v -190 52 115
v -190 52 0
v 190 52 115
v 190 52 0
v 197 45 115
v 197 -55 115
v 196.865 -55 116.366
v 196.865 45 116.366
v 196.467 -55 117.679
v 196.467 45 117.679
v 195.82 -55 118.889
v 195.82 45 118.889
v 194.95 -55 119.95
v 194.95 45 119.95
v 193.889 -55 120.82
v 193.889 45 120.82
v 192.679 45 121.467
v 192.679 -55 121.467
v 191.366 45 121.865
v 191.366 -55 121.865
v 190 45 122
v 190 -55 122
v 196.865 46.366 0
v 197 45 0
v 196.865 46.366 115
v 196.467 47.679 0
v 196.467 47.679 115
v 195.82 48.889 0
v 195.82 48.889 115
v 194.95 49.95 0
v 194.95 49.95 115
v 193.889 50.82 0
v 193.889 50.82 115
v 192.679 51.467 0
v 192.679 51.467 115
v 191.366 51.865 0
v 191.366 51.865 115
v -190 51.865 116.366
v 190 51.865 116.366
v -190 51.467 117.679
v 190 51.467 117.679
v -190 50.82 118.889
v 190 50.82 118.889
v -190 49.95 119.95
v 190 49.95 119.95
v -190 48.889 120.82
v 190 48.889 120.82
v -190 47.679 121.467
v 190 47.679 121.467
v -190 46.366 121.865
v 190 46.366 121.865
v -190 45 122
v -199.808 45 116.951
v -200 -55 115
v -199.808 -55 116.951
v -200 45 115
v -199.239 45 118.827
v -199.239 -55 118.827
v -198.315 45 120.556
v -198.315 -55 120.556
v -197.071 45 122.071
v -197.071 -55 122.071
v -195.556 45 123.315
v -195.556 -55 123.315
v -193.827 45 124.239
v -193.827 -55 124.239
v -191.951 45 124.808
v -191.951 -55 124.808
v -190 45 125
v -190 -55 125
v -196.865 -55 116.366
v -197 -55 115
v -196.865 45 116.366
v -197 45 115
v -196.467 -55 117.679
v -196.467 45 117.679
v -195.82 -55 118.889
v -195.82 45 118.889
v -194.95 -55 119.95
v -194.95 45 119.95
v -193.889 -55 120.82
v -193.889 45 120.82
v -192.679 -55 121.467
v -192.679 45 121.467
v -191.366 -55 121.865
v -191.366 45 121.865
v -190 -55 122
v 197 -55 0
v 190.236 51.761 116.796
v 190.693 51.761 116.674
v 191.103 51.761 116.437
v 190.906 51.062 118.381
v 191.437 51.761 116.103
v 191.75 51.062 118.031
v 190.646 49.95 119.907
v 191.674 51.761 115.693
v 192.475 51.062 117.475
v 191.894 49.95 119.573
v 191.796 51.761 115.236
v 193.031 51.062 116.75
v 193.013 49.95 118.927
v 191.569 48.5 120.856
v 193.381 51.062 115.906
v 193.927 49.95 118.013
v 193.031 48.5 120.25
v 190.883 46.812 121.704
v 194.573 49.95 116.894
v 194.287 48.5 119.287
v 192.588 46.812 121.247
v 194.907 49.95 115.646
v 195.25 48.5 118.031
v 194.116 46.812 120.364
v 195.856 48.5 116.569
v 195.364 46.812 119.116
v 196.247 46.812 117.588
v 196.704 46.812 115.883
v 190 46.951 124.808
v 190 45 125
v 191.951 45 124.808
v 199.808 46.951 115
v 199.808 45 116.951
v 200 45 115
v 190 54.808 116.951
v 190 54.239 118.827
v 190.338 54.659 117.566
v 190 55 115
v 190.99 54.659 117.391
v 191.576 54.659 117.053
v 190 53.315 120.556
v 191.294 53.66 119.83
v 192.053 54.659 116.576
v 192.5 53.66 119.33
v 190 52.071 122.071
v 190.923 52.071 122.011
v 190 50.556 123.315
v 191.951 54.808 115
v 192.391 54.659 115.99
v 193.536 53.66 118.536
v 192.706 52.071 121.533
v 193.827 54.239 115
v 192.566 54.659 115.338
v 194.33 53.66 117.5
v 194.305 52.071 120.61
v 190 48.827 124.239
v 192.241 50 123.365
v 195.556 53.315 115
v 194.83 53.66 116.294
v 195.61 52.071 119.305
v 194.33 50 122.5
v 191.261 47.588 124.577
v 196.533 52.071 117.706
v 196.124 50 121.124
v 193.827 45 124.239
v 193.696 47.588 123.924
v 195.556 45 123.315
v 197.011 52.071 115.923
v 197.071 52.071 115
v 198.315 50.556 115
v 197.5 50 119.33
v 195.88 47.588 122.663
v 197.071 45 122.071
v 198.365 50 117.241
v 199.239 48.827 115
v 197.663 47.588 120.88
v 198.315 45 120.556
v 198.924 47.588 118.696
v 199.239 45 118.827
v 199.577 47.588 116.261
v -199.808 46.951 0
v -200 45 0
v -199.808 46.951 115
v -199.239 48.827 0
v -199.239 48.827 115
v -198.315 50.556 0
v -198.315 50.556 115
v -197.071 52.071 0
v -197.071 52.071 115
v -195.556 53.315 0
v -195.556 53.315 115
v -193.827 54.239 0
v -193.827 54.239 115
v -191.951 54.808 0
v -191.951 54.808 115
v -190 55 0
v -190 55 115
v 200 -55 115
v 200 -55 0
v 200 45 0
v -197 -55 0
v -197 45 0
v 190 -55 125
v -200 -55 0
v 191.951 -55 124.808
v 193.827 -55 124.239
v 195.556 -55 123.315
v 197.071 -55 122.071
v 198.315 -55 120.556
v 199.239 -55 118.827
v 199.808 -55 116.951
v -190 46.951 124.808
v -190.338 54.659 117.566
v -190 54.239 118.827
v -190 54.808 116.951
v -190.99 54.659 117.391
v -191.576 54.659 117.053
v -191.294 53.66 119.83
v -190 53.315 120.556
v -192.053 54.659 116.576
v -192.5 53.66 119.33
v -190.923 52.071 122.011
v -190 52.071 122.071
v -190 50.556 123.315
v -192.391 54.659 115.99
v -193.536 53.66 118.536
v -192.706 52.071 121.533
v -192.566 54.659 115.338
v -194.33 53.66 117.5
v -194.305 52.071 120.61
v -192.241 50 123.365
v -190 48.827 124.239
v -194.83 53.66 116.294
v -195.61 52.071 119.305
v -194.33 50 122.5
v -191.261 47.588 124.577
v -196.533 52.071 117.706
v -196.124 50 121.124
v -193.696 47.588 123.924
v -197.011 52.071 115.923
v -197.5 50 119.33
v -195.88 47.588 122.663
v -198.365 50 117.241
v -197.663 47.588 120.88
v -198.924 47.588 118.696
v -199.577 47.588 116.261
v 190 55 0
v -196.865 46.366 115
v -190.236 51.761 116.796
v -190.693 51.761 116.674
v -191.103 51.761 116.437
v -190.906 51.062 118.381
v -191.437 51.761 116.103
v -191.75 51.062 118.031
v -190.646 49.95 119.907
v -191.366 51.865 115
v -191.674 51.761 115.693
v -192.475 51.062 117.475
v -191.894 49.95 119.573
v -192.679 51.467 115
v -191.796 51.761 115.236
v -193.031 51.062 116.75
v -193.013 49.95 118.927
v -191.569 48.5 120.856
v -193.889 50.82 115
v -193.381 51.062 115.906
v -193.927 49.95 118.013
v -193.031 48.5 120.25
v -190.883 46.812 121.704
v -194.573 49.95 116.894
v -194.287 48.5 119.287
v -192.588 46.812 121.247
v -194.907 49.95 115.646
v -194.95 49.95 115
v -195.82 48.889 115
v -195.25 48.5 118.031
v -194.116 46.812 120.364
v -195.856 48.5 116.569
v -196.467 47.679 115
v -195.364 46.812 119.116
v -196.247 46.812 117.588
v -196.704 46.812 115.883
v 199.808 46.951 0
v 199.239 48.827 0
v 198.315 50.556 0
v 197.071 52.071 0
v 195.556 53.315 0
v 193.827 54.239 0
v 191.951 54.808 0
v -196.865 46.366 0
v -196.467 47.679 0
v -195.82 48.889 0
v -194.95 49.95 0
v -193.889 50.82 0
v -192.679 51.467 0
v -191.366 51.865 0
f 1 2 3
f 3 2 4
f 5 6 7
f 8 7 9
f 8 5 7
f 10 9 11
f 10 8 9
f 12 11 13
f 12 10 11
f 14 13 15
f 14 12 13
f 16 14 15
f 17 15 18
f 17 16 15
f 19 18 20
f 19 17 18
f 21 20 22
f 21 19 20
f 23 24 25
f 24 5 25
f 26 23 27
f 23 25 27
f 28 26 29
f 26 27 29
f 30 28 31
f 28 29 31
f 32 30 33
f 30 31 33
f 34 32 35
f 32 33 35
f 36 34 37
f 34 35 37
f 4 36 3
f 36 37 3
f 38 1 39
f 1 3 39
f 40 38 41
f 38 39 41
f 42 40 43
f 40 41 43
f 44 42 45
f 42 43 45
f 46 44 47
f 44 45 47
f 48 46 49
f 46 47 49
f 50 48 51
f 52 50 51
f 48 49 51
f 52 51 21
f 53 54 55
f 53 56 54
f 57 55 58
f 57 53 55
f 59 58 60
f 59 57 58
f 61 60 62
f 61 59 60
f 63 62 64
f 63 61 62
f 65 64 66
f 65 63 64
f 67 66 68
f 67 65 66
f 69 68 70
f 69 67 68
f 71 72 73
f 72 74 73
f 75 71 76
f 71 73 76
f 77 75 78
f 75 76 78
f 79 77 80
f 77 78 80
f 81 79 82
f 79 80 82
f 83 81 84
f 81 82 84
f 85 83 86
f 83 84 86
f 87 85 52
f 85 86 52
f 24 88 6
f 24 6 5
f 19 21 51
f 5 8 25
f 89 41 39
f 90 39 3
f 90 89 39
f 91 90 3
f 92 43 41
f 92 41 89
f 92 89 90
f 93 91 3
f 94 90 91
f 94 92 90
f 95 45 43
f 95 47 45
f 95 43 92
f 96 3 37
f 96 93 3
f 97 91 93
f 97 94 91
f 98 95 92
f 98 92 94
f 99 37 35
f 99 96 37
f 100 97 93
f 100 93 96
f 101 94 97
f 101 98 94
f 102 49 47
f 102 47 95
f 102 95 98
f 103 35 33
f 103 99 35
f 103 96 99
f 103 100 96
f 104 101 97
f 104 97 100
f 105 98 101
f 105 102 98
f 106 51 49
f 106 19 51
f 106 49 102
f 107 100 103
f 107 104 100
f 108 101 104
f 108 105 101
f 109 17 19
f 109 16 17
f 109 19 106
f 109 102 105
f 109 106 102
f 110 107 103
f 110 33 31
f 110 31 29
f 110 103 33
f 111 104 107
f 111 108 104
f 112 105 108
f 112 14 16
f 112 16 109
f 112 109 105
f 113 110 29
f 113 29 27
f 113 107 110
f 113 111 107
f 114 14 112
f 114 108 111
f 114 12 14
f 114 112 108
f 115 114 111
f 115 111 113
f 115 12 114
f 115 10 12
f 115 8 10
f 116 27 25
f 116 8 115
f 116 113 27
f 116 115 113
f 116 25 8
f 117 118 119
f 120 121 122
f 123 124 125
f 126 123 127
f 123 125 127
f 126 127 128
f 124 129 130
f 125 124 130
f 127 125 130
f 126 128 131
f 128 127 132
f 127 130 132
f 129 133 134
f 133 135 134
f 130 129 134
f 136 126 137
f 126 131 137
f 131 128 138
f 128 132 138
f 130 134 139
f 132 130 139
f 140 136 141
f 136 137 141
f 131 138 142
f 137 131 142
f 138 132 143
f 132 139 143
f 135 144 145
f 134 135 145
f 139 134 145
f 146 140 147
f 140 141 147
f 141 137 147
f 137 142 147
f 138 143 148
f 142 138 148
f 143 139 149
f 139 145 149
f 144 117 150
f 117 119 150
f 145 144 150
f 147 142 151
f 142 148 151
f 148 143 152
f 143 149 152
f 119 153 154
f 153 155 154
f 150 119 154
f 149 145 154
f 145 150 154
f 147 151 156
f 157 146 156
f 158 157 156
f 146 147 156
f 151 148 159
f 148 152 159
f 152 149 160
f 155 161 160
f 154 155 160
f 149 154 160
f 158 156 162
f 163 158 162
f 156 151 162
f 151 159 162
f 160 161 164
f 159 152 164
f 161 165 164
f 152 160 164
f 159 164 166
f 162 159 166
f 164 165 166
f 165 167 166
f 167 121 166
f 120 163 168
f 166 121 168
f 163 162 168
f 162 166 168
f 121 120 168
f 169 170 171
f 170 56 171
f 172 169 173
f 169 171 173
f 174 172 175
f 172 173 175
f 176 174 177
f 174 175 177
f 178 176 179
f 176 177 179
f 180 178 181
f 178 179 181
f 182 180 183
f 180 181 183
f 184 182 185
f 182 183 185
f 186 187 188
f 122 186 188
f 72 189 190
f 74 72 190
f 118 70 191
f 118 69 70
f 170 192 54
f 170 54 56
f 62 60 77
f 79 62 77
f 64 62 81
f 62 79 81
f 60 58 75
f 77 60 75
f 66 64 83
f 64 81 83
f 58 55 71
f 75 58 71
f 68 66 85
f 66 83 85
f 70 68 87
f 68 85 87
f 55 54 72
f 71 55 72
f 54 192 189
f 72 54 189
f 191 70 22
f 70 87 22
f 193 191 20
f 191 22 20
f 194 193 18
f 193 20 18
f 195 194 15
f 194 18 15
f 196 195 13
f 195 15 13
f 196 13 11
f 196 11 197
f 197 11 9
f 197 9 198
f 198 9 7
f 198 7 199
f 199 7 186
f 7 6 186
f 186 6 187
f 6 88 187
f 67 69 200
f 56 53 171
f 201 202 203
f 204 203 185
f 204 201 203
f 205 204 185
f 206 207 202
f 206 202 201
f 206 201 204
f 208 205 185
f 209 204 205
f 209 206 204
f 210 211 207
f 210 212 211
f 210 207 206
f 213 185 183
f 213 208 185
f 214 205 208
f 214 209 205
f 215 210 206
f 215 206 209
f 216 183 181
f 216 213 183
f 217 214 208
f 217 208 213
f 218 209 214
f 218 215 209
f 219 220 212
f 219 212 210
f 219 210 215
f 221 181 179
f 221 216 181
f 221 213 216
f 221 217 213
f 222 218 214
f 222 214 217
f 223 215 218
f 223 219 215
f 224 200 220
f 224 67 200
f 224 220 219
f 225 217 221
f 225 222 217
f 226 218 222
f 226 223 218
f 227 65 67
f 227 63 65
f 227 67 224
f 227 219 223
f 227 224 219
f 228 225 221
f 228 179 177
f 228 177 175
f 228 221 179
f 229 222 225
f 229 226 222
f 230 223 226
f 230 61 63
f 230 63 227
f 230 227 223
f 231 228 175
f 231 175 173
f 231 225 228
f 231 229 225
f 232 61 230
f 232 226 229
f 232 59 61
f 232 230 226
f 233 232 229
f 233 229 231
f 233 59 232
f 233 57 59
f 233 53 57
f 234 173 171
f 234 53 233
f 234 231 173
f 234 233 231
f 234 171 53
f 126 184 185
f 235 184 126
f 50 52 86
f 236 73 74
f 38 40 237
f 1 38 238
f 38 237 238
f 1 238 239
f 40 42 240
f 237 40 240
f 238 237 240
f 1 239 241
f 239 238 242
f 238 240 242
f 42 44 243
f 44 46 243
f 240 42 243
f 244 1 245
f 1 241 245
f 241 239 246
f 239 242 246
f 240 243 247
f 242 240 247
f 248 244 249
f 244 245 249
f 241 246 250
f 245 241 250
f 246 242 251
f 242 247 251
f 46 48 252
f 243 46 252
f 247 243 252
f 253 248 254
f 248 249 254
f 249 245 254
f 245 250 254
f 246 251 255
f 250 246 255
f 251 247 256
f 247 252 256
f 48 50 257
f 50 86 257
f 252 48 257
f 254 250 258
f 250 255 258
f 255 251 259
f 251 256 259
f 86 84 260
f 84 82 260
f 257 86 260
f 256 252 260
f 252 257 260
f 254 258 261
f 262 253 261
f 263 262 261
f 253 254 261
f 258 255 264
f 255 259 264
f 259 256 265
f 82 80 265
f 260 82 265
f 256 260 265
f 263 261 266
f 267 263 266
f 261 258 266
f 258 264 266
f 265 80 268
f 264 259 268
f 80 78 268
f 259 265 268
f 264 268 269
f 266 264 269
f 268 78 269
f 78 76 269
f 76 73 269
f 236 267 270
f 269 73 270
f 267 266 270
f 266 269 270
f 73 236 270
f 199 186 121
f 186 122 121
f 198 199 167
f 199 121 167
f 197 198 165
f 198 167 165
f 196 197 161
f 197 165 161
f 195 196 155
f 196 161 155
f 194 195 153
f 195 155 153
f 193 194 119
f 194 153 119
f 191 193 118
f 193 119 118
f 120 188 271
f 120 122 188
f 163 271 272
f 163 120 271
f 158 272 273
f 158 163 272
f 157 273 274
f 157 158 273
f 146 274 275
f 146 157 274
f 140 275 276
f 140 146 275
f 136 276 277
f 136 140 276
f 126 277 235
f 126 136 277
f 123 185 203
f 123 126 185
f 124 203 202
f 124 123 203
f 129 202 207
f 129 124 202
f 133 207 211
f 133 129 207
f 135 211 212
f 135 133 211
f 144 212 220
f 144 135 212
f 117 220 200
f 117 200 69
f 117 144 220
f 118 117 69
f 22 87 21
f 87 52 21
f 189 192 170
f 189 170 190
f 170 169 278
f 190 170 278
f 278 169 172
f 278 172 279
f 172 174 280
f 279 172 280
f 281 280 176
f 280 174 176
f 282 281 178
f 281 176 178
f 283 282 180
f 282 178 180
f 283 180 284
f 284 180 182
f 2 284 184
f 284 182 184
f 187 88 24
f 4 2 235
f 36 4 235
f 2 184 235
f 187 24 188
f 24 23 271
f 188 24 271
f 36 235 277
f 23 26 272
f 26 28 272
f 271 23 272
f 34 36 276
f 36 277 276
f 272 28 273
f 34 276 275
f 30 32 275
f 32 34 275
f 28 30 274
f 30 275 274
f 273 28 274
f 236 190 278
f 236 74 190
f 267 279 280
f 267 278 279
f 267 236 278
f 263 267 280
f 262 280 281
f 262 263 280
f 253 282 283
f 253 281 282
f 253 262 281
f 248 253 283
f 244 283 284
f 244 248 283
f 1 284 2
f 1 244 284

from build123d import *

# Parameters (mm, degrees)
SKETCH_1_W      = 400
SKETCH_1_H      = 110
EXTRUDE_1_DEPTH = 125
FILLET_1_R      = 10
SHELL_1_T       = -3


with BuildPart() as part:
    # 草图1 → 凸台-拉伸1 (new body)
    with BuildSketch(Plane.XY):
        Rectangle(SKETCH_1_W, SKETCH_1_H)
    extrude(amount=EXTRUDE_1_DEPTH)

    # 圆角1
    fillet_1_edges = [part.edges().sort_by_distance(p)[0] for p in [
        (-200, 0, 125),
        (200, 0, 125),
        (0, 55, 125),
        (-200, 55, 62.5),
        (200, 55, 62.5),
    ]]
    fillet(fillet_1_edges, radius=FILLET_1_R)

    # 抽壳1
    shell_1_openings = [part.faces().sort_by_distance(p)[0] for p in [
        (0, 15.690355937, 0),
        (0, -55, 80.690355937),
    ]]
    offset(amount=SHELL_1_T, openings=shell_1_openings, kind=Kind.INTERSECTION)


solid = part.part
